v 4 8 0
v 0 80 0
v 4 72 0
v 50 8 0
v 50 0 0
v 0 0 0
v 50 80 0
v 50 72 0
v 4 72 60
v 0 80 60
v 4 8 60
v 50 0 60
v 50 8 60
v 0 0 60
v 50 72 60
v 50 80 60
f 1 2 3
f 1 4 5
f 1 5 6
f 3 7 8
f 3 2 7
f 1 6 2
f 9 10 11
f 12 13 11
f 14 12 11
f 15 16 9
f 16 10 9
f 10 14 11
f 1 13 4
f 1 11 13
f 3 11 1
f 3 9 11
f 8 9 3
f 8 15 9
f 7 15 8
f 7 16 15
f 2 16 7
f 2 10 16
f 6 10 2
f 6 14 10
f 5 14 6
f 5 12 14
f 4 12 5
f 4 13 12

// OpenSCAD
$fn = 32;

// ----------------------------------------------------------------------
// Structural section: channel 50 x 80 mm
// ----------------------------------------------------------------------

// --- parameters (mm) ---
sec_w = 50;               // channel width, X
sec_h = 80;               // channel height, Y
flange_t = 8;             // flange thickness
web_t = 4;                // web thickness
plate_t = 60;             // cut length, Z (extrusion height)

profile = [[0, 0], [50, 0], [50, 8], [4, 8], [4, 72], [50, 72], [50, 80], [0, 80]];  // primary outline, 8 points, counter clockwise

// --- the one profile operation ---
linear_extrude(height = plate_t) polygon(points = profile);
